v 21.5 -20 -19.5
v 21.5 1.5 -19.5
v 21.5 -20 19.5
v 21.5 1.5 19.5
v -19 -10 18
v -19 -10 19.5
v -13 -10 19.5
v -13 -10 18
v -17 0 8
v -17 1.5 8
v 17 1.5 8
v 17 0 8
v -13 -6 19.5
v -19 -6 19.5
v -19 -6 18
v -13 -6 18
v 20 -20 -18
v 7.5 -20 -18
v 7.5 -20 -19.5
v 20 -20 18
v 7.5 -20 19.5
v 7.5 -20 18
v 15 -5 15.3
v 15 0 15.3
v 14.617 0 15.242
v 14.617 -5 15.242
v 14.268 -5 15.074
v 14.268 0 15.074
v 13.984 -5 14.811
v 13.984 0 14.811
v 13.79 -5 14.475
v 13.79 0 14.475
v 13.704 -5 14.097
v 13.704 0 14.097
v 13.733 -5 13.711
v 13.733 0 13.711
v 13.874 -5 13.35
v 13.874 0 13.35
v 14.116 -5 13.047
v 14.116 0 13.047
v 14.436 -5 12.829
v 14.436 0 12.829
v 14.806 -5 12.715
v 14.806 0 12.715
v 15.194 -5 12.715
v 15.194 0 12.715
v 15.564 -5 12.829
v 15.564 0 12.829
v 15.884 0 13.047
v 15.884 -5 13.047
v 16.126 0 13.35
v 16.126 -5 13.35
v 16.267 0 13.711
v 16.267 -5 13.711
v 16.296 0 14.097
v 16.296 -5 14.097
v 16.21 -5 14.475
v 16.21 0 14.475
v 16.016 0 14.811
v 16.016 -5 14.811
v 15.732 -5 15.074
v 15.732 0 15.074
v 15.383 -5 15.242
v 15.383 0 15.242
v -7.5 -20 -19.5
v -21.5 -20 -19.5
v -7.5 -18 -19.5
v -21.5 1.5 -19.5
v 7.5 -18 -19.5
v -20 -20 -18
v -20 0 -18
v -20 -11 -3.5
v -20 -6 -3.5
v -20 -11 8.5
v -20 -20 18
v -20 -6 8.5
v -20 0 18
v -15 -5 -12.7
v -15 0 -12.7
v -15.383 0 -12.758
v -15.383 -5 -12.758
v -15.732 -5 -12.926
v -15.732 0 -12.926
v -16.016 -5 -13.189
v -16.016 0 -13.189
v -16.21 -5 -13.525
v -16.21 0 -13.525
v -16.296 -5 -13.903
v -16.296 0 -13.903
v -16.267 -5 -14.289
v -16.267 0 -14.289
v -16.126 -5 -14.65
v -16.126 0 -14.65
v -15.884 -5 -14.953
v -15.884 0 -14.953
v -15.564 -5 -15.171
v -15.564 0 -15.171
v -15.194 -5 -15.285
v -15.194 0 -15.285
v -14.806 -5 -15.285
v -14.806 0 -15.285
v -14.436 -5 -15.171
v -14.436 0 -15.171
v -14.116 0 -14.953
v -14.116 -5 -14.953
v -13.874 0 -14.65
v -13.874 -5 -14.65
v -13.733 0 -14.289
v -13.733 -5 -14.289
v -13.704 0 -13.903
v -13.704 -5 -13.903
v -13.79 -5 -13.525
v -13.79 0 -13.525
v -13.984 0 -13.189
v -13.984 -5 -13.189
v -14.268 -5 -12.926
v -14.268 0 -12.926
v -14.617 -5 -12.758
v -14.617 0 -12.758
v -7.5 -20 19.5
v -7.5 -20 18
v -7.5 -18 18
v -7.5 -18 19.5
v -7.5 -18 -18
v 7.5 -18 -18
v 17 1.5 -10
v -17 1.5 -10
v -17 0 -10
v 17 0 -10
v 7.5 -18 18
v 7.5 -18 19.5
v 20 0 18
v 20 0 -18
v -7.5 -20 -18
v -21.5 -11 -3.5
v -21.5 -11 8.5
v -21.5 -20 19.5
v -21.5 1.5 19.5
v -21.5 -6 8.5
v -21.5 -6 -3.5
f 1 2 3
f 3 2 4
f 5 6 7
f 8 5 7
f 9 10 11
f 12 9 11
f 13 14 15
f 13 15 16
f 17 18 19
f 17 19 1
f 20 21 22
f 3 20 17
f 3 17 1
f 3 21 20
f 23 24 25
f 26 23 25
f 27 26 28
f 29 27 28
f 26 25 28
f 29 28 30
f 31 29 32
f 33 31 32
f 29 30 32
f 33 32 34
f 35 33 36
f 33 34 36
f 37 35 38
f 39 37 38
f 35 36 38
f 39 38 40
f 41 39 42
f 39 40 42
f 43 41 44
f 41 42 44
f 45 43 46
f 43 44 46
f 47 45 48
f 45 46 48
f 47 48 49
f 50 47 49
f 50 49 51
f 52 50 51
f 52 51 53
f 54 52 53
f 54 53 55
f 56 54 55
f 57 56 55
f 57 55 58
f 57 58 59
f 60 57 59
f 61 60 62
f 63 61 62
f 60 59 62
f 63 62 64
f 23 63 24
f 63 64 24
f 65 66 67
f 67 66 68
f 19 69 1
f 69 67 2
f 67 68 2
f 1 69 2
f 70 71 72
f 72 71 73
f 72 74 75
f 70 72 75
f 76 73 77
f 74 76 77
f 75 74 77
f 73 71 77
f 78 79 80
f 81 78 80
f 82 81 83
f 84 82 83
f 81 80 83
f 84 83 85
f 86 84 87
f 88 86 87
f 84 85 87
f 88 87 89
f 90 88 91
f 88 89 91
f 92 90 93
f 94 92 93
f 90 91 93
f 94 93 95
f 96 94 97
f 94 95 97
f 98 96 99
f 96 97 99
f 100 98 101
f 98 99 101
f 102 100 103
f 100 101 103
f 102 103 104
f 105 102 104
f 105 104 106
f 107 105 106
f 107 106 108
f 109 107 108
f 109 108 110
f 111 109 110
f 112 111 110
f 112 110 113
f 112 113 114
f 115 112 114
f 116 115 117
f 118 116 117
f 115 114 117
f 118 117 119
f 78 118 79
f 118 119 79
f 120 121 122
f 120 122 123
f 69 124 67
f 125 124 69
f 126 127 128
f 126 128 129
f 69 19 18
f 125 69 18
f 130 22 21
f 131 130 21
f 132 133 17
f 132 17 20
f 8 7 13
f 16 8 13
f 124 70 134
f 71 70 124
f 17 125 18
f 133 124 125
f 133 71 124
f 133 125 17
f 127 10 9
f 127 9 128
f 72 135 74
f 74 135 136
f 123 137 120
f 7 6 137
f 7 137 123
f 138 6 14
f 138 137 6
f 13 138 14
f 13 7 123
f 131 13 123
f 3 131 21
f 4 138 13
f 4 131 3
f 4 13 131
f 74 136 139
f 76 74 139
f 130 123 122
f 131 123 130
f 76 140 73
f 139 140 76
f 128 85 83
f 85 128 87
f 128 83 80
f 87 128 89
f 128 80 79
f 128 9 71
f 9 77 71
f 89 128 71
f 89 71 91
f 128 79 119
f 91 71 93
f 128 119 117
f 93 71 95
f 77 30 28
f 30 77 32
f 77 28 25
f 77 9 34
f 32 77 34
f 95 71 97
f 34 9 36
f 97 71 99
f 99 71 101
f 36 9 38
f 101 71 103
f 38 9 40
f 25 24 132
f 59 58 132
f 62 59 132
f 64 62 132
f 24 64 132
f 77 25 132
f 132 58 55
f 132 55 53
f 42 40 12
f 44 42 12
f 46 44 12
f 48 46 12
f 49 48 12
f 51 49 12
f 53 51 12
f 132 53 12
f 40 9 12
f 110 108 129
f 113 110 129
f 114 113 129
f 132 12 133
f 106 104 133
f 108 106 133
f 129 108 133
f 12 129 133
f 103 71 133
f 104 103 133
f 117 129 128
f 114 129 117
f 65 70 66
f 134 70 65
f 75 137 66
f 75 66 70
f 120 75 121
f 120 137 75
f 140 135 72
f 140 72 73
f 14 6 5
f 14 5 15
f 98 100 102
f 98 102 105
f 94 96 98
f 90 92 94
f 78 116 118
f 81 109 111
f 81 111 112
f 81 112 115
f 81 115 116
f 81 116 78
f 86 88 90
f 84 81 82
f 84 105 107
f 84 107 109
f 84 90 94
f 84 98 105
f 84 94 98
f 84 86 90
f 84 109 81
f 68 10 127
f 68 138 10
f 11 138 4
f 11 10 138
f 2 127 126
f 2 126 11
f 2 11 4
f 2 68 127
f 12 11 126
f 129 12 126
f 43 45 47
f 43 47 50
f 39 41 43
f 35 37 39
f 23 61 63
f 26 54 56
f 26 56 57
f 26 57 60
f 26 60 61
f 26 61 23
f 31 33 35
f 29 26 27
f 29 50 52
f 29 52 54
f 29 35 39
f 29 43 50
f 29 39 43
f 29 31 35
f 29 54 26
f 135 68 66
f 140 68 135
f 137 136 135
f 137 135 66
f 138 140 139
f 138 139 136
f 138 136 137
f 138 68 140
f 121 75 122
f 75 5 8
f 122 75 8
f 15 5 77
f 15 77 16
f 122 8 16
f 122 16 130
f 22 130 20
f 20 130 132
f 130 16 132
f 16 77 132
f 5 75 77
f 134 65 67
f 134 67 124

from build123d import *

# Parameters (mm, degrees)
SKETCH_1_W             = 43
SKETCH_1_H             = 39
BODY_DEPTH             = 1.5
SKETCH_3_R             = 1.3
OLED_PILLAR_DEPTH      = 5
OLED_WINDOW_REACH      = 31.745
SKETCH_2_W             = 34
SKETCH_2_H             = 18
SKETCH_4_W             = 43
SKETCH_4_H             = 39
SKETCH_4_W_2           = 40
SKETCH_4_H_2           = 36
FARMFEELWALL_DEPTH     = 20
MICRO5PIN_WINDOW_REACH = 53.276
SKETCH_7_W             = 12
SKETCH_7_H             = 5
RESET_WINDOW_REACH     = 50.819
SKETCH_9_W             = 6
SKETCH_9_H             = 4
SKETCH_10_W            = 15
SKETCH_10_H            = 1.5
CUT_EXTRUDE_1_DEPTH    = 2


with BuildPart() as part:
    # 스케치1 → Body (new body)
    with BuildSketch(Plane(origin=(0, 0, 0), x_dir=(1, 0, 0), z_dir=(0, 1, 0))):
        Rectangle(SKETCH_1_W, SKETCH_1_H)
    extrude(amount=BODY_DEPTH)

    # 스케치3 → OLED_pillar (add)
    with BuildSketch(Plane.XZ):
        with Locations(Location((15, 14, 0), (0, 0, 90))):
            Circle(SKETCH_3_R)
        with Locations(Location((-15, -14, 0), (0, 0, 90))):
            Circle(SKETCH_3_R)
    extrude(amount=OLED_PILLAR_DEPTH)

    # 스케치2 → OLED_window (cut, up to next)
    with BuildSketch(Plane(origin=(0, 1.5, 0), x_dir=(1, 0, 0), z_dir=(0, 1, 0)), mode=Mode.PRIVATE) as oled_window_sk1:
        with Locations((0, 1)):
            Rectangle(SKETCH_2_W, SKETCH_2_H)
    oled_window_tool1 = extrude(oled_window_sk1.sketch, amount=-OLED_WINDOW_REACH, mode=Mode.PRIVATE) & part.part
    add(oled_window_tool1.solids().sort_by_distance((0, 1.5, -1))[0], mode=Mode.SUBTRACT)

    # 스케치4 → FarmFeelWall (add)
    with BuildSketch(Plane.XZ):
        Rectangle(SKETCH_4_W, SKETCH_4_H)
        Rectangle(SKETCH_4_W_2, SKETCH_4_H_2, mode=Mode.SUBTRACT)
    extrude(amount=FARMFEELWALL_DEPTH)

    # 스케치7 → micro5pin_window (cut, up to next)
    with BuildSketch(Plane.ZY.offset(21.5), mode=Mode.PRIVATE) as micro5pin_window_sk1:
        with Locations((2.5, -8.5)):
            Rectangle(SKETCH_7_W, SKETCH_7_H)
    micro5pin_window_tool1 = extrude(micro5pin_window_sk1.sketch, amount=-MICRO5PIN_WINDOW_REACH, mode=Mode.PRIVATE) & part.part
    add(micro5pin_window_tool1.solids().sort_by_distance((-21.5, -8.5, 2.5))[0], mode=Mode.SUBTRACT)

    # 스케치9 → reset_window (cut, up to next)
    with BuildSketch(Plane.XY.offset(19.5), mode=Mode.PRIVATE) as reset_window_sk1:
        with Locations((-16, -8)):
            Rectangle(SKETCH_9_W, SKETCH_9_H)
    reset_window_tool1 = extrude(reset_window_sk1.sketch, amount=-RESET_WINDOW_REACH, mode=Mode.PRIVATE) & part.part
    add(reset_window_tool1.solids().sort_by_distance((-16, -8, 19.5))[0], mode=Mode.SUBTRACT)

    # 스케치10 → 컷-돌출1 (cut)
    with BuildSketch(Plane.XZ.offset(20)):
        with Locations((0, -18.75)):
            Rectangle(SKETCH_10_W, SKETCH_10_H)
        with Locations((0, 18.75)):
            Rectangle(SKETCH_10_W, SKETCH_10_H)
    extrude(amount=-CUT_EXTRUDE_1_DEPTH, mode=Mode.SUBTRACT)


solid = part.part
